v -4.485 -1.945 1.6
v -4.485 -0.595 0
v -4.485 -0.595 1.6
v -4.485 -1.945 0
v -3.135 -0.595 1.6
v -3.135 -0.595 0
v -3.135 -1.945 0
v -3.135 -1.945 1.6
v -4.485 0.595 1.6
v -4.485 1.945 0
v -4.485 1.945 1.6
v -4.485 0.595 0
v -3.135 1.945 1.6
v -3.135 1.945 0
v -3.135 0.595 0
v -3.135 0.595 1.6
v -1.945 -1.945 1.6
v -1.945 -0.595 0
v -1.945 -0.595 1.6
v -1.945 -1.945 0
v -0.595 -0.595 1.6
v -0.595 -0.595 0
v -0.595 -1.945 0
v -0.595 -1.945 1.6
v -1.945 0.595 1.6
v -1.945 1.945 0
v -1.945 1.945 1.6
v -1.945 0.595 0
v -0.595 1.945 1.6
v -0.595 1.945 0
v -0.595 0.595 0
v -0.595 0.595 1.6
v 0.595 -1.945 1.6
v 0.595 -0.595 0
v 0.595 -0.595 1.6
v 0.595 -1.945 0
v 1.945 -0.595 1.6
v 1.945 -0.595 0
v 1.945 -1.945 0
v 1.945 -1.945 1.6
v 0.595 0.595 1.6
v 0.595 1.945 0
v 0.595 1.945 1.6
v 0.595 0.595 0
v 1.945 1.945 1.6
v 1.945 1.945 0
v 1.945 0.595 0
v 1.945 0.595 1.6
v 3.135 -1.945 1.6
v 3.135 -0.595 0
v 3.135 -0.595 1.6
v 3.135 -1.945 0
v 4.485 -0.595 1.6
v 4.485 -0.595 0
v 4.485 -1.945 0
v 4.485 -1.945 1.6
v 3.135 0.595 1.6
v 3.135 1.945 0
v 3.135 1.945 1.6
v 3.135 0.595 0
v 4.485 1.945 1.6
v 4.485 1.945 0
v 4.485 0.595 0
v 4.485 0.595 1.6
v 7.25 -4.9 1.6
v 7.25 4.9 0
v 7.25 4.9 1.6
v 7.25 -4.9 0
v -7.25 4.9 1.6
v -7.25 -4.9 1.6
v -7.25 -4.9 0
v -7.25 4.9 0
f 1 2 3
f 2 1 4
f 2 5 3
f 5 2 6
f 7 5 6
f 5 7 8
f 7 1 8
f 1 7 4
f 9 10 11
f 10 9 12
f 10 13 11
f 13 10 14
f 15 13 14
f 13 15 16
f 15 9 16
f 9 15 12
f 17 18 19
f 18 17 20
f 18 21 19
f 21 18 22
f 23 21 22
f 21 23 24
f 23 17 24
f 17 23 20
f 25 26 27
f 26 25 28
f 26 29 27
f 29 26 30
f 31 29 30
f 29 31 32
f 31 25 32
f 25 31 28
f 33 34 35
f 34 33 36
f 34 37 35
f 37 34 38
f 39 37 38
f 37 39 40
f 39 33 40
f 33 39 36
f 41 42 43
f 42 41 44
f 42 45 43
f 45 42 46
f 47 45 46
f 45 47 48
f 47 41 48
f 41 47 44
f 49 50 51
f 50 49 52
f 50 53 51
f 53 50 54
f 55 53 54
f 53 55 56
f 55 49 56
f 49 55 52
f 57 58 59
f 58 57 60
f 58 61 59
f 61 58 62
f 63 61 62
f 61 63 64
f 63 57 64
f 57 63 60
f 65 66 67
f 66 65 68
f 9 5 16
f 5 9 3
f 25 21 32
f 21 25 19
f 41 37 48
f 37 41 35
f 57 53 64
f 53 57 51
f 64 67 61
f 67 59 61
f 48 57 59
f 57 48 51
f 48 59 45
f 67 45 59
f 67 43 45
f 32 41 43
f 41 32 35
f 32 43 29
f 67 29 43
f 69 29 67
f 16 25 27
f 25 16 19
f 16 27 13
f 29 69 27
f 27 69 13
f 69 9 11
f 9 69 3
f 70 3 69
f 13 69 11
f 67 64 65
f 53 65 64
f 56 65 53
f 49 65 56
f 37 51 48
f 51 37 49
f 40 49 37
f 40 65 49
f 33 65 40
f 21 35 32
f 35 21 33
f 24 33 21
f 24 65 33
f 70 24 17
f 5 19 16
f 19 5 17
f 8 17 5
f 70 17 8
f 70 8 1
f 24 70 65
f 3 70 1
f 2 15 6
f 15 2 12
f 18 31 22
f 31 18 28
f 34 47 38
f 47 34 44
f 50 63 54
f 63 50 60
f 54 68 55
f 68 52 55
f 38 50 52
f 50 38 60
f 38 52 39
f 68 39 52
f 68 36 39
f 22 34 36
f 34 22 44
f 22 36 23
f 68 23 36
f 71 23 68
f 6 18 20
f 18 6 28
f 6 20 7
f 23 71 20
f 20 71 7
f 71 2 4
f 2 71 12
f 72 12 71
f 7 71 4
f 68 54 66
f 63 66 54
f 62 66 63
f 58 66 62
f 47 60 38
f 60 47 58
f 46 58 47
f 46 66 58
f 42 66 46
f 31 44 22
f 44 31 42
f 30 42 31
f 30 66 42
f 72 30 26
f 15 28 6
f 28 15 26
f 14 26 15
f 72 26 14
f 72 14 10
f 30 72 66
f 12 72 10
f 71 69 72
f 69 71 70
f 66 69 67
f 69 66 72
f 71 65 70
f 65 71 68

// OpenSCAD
// file: plug-v2-jumpers.scad
// BTS7960 driver-side holder for six *individual* female Dupont jumper ends.
// Two printed dummies occupy R_IS and L_IS. Mechanical fit prototype only.
// Dimensions are millimetres. Actual 1P jumper plastic must be measured.

$fn = 48;

part = "fit_gauge"; // [fit_gauge,lower,upper,dummy,assembly,exploded]
side_relief = 0.0; // v3 test uses 1.0 mm extra outward space per half

pitch = 2.54;
pin_aperture = 1.35;   // carried over from the driver gauge that fitted
front_lip = 1.60;

// Provisional dimensions for one separate 1P female Dupont plastic end.
single_x = 2.54;
single_y = 2.54;
single_z = 14.00;
pack_clearance = 0.40; // total clearance around a packed 2x4 block
pack_clearance_y = pack_clearance + 2*side_relief;

nose_x = 14.50;         // keep the v1 driver-side x envelope
nose_y = 7.80 + 2*side_relief;
rear_stop = 3.00;       // plastic behind the female ends
nose_z = front_lip + single_z + rear_stop;

rear_x = 25.00;
rear_y = 15.00;
rear_z = 18.00;
rear_corner_r = 2.50;
total_z = nose_z + rear_z;

wire_channel_x = 1.50; // provisional; verify against jumper insulation
wire_channel_y = 2.20; // open at the split so cables can be laid in place
rear_chamber_x = 13.00;
rear_chamber_y = 8.00;
rear_chamber_depth = 12.50;
cable_exit_d = 6.00;

screw_x = 9.00;
screw_z = nose_z + 7.00;
screw_clearance_d = 3.20; // M3 bolts and external nuts as in v1
mark_depth = 0.60;

dummy_x = single_x;
dummy_y = single_y;
dummy_z = single_z;
dummy_pin_hole = 1.45;

epsilon = 0.02;

function contact_x(col) = (col - 1.5)*pitch;
function contact_y(row) = (row - 0.5)*pitch;
// Column 1 in each row is the unused current-sense (IS) contact.
function used(col) = col != 1;

assert(4*single_x + pack_clearance < nose_x);
assert(2*single_y + pack_clearance_y < nose_y);

module eight_pin_pattern(h=front_lip) {
    for (col = [0:3], row = [0:1])
        translate([contact_x(col), contact_y(row), -epsilon])
            linear_extrude(height=h+2*epsilon)
                square([pin_aperture, pin_aperture], center=true);
}

module fit_gauge() {
    difference() {
        translate([-nose_x/2, -nose_y/2, 0])
            cube([nose_x, nose_y, front_lip]);
        eight_pin_pattern();
    }
}

module outside_shell() {
    union() {
        translate([-nose_x/2, -nose_y/2, 0])
            cube([nose_x, nose_y, nose_z]);
        hull()
            for (x = [-rear_x/2+rear_corner_r,
                       rear_x/2-rear_corner_r],
                 z = [nose_z+rear_corner_r,
                      total_z-rear_corner_r])
                translate([x, 0, z])
                    rotate([-90, 0, 0])
                        cylinder(r=rear_corner_r, h=rear_y, center=true);
    }
}

module packed_ends_pocket() {
    translate([-(4*single_x+pack_clearance)/2,
               -(2*single_y+pack_clearance_y)/2, front_lip])
        cube([4*single_x+pack_clearance,
              2*single_y+pack_clearance_y, single_z+epsilon]);
}

module wire_channels() {
    // Individual comb slots only behind the six occupied positions. Each
    // channel opens to y=0, allowing preterminated jumper wires to be laid
    // into either clamshell half without passing the male end through a hole.
    for (col = [0:3], row = [0:1]) if (used(col))
        translate([contact_x(col)-wire_channel_x/2,
                   row == 0 ? -wire_channel_y : 0,
                   front_lip+single_z-epsilon])
            cube([wire_channel_x, wire_channel_y,
                  rear_stop+2*epsilon]);
}

module rear_chamber() {
    translate([-rear_chamber_x/2, -rear_chamber_y/2,
               nose_z-epsilon])
        cube([rear_chamber_x, rear_chamber_y,
              rear_chamber_depth+2*epsilon]);
    translate([0, 0, nose_z+rear_chamber_depth-epsilon])
        cylinder(d=cable_exit_d,
                 h=rear_z-rear_chamber_depth+2*epsilon);
}

module fastener_holes() {
    for (x = [-screw_x, screw_x])
        translate([x, -rear_y/2-epsilon, screw_z])
            rotate([-90, 0, 0])
                cylinder(d=screw_clearance_d, h=rear_y+2*epsilon);
}

module orientation_mark() {
    // This is a visual mark only; the bare 2x4 driver header is symmetric.
    translate([0, rear_y/2+epsilon, nose_z+3.10])
        rotate([90, 0, 0])
            linear_extrude(height=mark_depth+2*epsilon)
                mirror([1, 0, 0])
                    text("VCC", size=3.80,
                         halign="center", valign="center");
}

module whole_shell() {
    difference() {
        outside_shell();
        packed_ends_pocket();
        wire_channels();
        rear_chamber();
        eight_pin_pattern();
        fastener_holes();
        orientation_mark();
    }
}

module lower_half() {
    intersection() {
        whole_shell();
        translate([-rear_x, -rear_y, -epsilon])
            cube([2*rear_x, rear_y, total_z+2*epsilon]);
    }
}

module upper_half() {
    intersection() {
        whole_shell();
        translate([-rear_x, 0, -epsilon])
            cube([2*rear_x, rear_y, total_z+2*epsilon]);
    }
}

module unused_is_dummy() {
    difference() {
        translate([-dummy_x/2, -dummy_y/2, 0])
            cube([dummy_x, dummy_y, dummy_z]);
        translate([-dummy_pin_hole/2, -dummy_pin_hole/2, -epsilon])
            cube([dummy_pin_hole, dummy_pin_hole,
                  dummy_z+2*epsilon]);
    }
}

module mockup_ends() {
    for (col = [0:3], row = [0:1])
        translate([contact_x(col), contact_y(row), front_lip])
            if (used(col))
                color([0.12, 0.12, 0.12, 0.6])
                    translate([-single_x/2, -single_y/2, 0])
                        cube([single_x, single_y, single_z]);
            else
                color([0.95, 0.48, 0.18]) unused_is_dummy();
}

if (part == "fit_gauge") fit_gauge();
else if (part == "lower") rotate([-90, 0, 0]) lower_half();
else if (part == "upper") rotate([90, 0, 0]) upper_half();
else if (part == "dummy") unused_is_dummy();
else if (part == "assembly") {
    lower_half();
    color([0.40, 0.75, 0.85, 0.45]) upper_half();
    mockup_ends();
} else if (part == "exploded") {
    color([0.40, 0.75, 0.85]) translate([0, 6, 0]) upper_half();
    color([0.45, 0.70, 0.45]) translate([0, -6, 0]) lower_half();
    mockup_ends();
} else assert(false, str("Unknown part: ", part));
// main file
// Driver plug v3: 1 mm outward relief in EACH half for the 3+3 jumper ends.
// Front pin-hole centres remain at the fixed 2.54 mm driver grid.
// Prototype for the photographed gap; verify against real jumpers and driver.

include <plug-v2-jumpers.scad>
side_relief = 1.0;
